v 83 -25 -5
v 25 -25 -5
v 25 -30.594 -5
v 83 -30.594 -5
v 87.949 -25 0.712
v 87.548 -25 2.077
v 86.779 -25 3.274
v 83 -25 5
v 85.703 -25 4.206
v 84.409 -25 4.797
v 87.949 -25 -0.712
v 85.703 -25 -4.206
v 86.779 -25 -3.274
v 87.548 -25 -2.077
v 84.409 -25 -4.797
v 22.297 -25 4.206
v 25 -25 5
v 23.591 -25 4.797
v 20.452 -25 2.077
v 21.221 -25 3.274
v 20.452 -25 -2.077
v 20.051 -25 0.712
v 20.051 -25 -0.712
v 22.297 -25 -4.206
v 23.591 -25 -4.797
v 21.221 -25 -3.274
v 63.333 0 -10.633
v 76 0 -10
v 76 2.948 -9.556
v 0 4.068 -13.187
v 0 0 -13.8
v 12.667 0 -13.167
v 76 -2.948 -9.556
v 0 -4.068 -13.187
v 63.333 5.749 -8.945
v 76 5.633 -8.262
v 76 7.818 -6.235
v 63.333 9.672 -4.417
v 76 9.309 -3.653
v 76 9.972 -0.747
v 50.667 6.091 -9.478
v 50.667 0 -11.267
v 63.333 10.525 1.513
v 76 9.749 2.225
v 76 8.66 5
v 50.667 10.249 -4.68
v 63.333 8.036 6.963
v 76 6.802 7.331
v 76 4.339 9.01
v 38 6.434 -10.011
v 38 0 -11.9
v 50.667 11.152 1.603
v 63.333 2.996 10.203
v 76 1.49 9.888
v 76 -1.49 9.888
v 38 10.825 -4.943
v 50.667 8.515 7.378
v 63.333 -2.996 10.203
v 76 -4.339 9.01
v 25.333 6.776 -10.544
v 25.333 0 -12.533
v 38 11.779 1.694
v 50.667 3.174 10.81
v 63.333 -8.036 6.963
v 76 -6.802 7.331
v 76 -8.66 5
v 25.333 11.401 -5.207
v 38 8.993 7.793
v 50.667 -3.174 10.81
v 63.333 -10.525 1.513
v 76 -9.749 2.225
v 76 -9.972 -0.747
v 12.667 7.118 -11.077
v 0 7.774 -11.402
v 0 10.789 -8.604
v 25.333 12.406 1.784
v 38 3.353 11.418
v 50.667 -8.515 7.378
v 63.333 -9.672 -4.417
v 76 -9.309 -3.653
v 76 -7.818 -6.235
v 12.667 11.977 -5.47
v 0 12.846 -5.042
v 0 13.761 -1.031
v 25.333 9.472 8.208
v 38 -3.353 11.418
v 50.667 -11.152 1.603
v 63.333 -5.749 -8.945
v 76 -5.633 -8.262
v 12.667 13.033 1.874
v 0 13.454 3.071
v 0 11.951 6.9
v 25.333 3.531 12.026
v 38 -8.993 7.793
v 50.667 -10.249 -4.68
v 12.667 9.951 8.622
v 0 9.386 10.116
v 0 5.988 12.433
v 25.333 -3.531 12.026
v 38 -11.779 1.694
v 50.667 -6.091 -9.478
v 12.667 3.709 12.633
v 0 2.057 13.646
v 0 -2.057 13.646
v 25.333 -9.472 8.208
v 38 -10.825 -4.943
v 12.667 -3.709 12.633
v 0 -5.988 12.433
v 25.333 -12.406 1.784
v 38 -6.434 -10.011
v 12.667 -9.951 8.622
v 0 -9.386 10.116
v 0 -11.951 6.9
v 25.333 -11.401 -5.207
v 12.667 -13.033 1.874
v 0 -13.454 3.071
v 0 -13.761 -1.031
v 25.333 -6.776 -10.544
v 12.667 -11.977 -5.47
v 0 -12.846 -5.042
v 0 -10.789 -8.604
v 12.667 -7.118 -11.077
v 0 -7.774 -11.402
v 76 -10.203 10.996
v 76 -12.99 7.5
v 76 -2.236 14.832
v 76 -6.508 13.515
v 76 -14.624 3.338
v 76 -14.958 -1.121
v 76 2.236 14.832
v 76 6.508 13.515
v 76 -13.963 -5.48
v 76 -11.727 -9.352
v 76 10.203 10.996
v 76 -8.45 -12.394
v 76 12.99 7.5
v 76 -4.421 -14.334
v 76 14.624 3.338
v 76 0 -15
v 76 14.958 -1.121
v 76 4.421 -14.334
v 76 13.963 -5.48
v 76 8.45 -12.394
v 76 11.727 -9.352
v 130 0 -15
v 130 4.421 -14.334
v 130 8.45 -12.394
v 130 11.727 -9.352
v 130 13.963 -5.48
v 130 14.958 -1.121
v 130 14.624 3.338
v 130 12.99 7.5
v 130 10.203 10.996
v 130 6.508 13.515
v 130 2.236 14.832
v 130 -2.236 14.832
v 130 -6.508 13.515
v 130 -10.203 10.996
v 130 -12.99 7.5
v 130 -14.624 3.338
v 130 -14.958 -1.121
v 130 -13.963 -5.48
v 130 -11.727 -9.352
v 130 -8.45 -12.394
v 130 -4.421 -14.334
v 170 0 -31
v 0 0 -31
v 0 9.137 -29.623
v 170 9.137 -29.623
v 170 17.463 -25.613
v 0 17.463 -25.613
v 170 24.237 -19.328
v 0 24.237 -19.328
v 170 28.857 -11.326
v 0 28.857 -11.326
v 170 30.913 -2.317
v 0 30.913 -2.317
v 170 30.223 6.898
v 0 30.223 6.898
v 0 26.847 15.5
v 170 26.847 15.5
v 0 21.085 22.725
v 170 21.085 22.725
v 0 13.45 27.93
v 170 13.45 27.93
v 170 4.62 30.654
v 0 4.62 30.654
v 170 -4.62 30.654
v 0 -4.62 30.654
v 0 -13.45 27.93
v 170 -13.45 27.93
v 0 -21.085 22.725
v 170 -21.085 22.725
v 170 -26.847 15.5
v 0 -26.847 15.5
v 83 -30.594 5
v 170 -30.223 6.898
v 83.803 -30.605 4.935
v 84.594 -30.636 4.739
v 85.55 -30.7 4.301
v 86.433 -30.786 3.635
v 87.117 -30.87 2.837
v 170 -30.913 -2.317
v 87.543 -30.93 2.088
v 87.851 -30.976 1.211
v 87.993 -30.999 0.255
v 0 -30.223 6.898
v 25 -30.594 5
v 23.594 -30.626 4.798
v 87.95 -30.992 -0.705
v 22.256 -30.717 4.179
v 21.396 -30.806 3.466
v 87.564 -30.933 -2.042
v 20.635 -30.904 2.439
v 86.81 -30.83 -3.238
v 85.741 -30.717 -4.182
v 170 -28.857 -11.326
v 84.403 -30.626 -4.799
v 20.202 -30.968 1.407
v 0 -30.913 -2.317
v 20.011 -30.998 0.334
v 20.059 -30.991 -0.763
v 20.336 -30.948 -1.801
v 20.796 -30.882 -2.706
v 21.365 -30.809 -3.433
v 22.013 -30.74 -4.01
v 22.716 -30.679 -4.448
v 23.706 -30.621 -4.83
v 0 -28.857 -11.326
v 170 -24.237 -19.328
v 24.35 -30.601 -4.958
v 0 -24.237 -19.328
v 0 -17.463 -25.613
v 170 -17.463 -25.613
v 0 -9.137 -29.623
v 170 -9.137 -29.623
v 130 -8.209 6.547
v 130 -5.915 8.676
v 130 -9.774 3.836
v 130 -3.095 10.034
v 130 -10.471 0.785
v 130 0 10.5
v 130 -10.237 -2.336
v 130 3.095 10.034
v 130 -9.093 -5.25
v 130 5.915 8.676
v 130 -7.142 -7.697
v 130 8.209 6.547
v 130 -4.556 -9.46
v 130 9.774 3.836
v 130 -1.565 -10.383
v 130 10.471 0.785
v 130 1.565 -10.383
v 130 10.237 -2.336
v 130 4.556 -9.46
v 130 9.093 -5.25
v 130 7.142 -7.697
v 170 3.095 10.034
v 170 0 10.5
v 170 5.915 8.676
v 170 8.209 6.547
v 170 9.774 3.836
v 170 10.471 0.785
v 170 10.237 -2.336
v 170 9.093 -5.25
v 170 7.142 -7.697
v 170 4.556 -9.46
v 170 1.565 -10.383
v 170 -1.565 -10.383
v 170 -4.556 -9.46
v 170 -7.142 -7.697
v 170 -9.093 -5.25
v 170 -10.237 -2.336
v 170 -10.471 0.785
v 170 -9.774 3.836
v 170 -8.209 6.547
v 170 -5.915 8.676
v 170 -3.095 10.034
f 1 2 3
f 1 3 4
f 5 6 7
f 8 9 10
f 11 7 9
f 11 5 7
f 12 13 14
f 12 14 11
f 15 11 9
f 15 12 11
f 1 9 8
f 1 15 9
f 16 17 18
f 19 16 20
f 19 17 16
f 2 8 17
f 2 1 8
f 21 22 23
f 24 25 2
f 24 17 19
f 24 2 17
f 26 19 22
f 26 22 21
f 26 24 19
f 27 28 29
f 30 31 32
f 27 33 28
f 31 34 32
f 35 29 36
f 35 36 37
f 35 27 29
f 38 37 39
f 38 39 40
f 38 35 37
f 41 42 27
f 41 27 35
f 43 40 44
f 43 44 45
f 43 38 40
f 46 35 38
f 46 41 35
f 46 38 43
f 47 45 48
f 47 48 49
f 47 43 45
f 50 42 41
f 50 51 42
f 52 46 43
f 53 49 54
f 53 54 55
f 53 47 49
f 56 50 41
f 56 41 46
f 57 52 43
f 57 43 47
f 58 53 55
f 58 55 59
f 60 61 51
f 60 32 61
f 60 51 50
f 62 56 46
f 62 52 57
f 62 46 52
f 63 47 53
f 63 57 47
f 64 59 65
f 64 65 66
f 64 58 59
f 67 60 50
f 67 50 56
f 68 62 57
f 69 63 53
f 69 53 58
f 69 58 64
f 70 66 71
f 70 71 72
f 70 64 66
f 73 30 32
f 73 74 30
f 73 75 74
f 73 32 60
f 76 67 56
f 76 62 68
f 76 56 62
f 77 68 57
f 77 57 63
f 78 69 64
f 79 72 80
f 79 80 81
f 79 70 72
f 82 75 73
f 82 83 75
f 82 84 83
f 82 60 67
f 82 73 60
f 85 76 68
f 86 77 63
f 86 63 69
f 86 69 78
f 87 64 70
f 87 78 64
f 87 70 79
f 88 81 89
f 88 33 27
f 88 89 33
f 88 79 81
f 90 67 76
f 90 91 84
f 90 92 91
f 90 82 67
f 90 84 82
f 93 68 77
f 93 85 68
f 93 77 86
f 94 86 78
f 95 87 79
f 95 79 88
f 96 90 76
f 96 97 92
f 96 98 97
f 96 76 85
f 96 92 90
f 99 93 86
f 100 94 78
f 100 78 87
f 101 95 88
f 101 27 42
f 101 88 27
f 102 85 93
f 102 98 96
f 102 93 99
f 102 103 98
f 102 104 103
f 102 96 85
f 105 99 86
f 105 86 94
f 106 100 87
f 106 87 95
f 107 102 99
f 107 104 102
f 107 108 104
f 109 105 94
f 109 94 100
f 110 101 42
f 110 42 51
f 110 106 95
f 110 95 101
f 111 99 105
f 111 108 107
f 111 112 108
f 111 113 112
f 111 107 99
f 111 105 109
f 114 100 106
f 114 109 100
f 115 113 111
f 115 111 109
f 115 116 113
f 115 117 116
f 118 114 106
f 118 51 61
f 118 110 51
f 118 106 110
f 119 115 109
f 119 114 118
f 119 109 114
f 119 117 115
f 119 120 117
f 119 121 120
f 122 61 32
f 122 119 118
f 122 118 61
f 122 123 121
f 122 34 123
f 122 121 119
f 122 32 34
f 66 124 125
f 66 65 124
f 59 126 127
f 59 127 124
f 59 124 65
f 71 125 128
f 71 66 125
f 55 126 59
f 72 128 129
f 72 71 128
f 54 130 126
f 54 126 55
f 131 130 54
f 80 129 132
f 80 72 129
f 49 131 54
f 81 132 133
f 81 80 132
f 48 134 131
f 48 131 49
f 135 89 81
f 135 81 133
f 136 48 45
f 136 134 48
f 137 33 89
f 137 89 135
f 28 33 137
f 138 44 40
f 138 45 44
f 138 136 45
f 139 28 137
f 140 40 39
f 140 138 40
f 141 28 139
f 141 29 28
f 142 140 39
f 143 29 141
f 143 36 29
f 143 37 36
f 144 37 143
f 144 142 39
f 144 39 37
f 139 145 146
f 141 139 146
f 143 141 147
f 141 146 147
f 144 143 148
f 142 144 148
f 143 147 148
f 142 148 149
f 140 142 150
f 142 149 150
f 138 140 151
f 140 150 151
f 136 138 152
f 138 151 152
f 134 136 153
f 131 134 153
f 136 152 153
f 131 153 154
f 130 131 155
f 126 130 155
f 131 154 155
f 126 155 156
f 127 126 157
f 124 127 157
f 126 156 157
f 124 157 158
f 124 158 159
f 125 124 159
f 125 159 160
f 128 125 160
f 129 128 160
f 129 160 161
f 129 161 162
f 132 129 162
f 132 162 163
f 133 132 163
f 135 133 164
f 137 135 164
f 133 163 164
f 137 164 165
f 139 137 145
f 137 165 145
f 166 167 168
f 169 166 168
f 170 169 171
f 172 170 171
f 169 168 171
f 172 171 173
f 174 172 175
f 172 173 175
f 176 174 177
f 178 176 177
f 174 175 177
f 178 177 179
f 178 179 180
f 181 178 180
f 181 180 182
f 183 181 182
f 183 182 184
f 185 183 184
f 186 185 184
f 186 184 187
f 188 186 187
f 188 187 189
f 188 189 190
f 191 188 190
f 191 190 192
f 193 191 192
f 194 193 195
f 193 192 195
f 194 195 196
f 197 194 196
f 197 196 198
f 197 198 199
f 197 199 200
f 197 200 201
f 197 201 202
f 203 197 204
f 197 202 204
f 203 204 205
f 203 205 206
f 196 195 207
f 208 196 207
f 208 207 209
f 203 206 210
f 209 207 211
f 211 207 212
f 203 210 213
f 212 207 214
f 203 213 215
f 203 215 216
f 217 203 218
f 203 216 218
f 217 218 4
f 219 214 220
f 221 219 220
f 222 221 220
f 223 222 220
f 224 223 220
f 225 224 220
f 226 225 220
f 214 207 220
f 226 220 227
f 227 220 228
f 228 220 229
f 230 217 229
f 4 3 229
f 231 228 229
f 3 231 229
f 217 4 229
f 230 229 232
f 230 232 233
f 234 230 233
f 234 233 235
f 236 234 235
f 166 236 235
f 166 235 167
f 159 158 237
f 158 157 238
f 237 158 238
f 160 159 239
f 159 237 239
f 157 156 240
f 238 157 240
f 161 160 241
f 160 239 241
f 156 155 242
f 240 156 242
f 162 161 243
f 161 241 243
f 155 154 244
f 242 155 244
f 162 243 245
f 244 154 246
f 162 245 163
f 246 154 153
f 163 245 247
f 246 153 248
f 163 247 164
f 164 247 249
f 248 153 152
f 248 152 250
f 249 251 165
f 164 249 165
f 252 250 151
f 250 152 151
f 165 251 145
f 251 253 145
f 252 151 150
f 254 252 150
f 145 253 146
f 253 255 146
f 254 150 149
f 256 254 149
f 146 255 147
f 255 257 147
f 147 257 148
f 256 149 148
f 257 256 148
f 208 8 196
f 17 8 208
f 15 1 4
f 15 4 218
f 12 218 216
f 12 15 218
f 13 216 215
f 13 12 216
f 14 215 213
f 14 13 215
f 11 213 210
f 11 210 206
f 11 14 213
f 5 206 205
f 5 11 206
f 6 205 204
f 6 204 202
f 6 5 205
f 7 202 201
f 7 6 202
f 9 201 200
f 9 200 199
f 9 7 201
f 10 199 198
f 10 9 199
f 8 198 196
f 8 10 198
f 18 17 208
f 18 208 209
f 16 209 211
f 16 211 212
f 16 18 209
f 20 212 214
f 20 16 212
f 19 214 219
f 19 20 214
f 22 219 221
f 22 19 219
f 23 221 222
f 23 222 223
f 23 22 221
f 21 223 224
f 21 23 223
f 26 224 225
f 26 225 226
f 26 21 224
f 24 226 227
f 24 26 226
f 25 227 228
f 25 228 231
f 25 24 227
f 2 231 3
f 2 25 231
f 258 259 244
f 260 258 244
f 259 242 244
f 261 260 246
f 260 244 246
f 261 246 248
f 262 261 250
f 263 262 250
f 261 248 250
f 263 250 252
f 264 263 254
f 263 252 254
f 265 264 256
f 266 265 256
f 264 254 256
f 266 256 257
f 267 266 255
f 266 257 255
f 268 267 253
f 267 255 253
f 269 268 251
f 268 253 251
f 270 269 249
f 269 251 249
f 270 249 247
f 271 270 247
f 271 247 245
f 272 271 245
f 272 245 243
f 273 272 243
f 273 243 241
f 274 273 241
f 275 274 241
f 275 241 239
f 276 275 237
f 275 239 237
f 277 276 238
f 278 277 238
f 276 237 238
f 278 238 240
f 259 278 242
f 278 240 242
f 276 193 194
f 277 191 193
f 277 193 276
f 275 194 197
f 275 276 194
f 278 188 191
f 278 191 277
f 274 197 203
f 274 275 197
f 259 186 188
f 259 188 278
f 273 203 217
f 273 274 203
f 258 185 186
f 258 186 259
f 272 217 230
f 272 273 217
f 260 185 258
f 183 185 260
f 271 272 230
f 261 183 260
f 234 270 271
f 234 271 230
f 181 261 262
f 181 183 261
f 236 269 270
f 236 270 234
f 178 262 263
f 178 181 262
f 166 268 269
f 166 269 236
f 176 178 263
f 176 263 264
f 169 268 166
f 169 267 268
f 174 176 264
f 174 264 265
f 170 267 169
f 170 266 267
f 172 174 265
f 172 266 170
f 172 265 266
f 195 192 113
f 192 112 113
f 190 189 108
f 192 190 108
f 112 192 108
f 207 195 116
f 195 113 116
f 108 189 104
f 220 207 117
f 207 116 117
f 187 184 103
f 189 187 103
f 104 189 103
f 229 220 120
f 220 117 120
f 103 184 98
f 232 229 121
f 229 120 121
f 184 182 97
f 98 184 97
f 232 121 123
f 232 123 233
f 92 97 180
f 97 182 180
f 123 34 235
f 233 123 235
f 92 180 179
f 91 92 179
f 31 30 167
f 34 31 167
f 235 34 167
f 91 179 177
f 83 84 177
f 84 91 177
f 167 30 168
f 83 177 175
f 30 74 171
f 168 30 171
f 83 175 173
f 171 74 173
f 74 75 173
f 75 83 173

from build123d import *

# Parameters (mm, degrees)
SKETCH_2_R              = 31
EXTRUDE_1_DEPTH         = 170
HOLE_WIZARD_M24_1_D     = 21
HOLE_WIZARD_M24_1_DEPTH = 40
HOLE_WIZARD_M24_1_TIP   = 6.3090365
CUT_EXTRUDE_START       = -40
SKETCH_6_R              = 15
CUT_EXTRUDE_1_DEPTH     = 54
CUT_EXTRUDE_START_2     = -25
CUT_EXTRUDE_2_DEPTH     = 151.561954876


with BuildPart() as part:
    # 草图2 → 凸台-拉伸1 (new body)
    with BuildSketch(Plane(origin=(0, 0, 0), x_dir=(0, 0, -1), z_dir=(1, 0, 0))):
        Circle(SKETCH_2_R)
    extrude(amount=EXTRUDE_1_DEPTH)

    # M24 螺纹孔1
    with Locations(Plane(origin=(170, 0, 0), x_dir=(0, 0, -1), z_dir=(1, 0, 0))):
        with Locations((0, 0)):
            Hole(HOLE_WIZARD_M24_1_D / 2, depth=HOLE_WIZARD_M24_1_DEPTH)
            with Locations((0, 0, -(HOLE_WIZARD_M24_1_DEPTH + HOLE_WIZARD_M24_1_TIP / 2))):  # 118° drill point
                Cone(0, HOLE_WIZARD_M24_1_D / 2, HOLE_WIZARD_M24_1_TIP, mode=Mode.SUBTRACT)

    # 草图6 → 切除-拉伸1 (cut)
    with BuildSketch(Plane(origin=(170, 0, 0), x_dir=(0, 0, -1), z_dir=(1, 0, 0)).offset(CUT_EXTRUDE_START)):
        Circle(SKETCH_6_R)
    extrude(amount=-CUT_EXTRUDE_1_DEPTH, mode=Mode.SUBTRACT)

    # 草图7 → 切除-旋转1 (revolve, cut)
    with BuildSketch(Plane.XY, mode=Mode.PRIVATE) as cut_revolve_1_sk:
        Polygon((0, 0), (76, 0), (76, 10), (0, 13.8), align=None)
    revolve(cut_revolve_1_sk.sketch.rotate(Axis((76, 0, 0), (1, 0, 0)), 270), axis=Axis((76, 0, 0), (1, 0, 0)), mode=Mode.SUBTRACT)

    # 草图8 → 切除-拉伸2 (cut, through all)
    with BuildSketch(Plane(origin=(0, 0, 0), x_dir=(1, 0, 0), z_dir=(0, 1, 0)).offset(CUT_EXTRUDE_START_2)):
        with BuildLine():
            Line((25, 5), (83, 5))
            ThreePointArc((83, 5), (88, 0), (83, -5))
            Line((83, -5), (25, -5))
            ThreePointArc((25, -5), (20, 0), (25, 5))
        make_face()
    extrude(amount=-CUT_EXTRUDE_2_DEPTH, mode=Mode.SUBTRACT)


solid = part.part
